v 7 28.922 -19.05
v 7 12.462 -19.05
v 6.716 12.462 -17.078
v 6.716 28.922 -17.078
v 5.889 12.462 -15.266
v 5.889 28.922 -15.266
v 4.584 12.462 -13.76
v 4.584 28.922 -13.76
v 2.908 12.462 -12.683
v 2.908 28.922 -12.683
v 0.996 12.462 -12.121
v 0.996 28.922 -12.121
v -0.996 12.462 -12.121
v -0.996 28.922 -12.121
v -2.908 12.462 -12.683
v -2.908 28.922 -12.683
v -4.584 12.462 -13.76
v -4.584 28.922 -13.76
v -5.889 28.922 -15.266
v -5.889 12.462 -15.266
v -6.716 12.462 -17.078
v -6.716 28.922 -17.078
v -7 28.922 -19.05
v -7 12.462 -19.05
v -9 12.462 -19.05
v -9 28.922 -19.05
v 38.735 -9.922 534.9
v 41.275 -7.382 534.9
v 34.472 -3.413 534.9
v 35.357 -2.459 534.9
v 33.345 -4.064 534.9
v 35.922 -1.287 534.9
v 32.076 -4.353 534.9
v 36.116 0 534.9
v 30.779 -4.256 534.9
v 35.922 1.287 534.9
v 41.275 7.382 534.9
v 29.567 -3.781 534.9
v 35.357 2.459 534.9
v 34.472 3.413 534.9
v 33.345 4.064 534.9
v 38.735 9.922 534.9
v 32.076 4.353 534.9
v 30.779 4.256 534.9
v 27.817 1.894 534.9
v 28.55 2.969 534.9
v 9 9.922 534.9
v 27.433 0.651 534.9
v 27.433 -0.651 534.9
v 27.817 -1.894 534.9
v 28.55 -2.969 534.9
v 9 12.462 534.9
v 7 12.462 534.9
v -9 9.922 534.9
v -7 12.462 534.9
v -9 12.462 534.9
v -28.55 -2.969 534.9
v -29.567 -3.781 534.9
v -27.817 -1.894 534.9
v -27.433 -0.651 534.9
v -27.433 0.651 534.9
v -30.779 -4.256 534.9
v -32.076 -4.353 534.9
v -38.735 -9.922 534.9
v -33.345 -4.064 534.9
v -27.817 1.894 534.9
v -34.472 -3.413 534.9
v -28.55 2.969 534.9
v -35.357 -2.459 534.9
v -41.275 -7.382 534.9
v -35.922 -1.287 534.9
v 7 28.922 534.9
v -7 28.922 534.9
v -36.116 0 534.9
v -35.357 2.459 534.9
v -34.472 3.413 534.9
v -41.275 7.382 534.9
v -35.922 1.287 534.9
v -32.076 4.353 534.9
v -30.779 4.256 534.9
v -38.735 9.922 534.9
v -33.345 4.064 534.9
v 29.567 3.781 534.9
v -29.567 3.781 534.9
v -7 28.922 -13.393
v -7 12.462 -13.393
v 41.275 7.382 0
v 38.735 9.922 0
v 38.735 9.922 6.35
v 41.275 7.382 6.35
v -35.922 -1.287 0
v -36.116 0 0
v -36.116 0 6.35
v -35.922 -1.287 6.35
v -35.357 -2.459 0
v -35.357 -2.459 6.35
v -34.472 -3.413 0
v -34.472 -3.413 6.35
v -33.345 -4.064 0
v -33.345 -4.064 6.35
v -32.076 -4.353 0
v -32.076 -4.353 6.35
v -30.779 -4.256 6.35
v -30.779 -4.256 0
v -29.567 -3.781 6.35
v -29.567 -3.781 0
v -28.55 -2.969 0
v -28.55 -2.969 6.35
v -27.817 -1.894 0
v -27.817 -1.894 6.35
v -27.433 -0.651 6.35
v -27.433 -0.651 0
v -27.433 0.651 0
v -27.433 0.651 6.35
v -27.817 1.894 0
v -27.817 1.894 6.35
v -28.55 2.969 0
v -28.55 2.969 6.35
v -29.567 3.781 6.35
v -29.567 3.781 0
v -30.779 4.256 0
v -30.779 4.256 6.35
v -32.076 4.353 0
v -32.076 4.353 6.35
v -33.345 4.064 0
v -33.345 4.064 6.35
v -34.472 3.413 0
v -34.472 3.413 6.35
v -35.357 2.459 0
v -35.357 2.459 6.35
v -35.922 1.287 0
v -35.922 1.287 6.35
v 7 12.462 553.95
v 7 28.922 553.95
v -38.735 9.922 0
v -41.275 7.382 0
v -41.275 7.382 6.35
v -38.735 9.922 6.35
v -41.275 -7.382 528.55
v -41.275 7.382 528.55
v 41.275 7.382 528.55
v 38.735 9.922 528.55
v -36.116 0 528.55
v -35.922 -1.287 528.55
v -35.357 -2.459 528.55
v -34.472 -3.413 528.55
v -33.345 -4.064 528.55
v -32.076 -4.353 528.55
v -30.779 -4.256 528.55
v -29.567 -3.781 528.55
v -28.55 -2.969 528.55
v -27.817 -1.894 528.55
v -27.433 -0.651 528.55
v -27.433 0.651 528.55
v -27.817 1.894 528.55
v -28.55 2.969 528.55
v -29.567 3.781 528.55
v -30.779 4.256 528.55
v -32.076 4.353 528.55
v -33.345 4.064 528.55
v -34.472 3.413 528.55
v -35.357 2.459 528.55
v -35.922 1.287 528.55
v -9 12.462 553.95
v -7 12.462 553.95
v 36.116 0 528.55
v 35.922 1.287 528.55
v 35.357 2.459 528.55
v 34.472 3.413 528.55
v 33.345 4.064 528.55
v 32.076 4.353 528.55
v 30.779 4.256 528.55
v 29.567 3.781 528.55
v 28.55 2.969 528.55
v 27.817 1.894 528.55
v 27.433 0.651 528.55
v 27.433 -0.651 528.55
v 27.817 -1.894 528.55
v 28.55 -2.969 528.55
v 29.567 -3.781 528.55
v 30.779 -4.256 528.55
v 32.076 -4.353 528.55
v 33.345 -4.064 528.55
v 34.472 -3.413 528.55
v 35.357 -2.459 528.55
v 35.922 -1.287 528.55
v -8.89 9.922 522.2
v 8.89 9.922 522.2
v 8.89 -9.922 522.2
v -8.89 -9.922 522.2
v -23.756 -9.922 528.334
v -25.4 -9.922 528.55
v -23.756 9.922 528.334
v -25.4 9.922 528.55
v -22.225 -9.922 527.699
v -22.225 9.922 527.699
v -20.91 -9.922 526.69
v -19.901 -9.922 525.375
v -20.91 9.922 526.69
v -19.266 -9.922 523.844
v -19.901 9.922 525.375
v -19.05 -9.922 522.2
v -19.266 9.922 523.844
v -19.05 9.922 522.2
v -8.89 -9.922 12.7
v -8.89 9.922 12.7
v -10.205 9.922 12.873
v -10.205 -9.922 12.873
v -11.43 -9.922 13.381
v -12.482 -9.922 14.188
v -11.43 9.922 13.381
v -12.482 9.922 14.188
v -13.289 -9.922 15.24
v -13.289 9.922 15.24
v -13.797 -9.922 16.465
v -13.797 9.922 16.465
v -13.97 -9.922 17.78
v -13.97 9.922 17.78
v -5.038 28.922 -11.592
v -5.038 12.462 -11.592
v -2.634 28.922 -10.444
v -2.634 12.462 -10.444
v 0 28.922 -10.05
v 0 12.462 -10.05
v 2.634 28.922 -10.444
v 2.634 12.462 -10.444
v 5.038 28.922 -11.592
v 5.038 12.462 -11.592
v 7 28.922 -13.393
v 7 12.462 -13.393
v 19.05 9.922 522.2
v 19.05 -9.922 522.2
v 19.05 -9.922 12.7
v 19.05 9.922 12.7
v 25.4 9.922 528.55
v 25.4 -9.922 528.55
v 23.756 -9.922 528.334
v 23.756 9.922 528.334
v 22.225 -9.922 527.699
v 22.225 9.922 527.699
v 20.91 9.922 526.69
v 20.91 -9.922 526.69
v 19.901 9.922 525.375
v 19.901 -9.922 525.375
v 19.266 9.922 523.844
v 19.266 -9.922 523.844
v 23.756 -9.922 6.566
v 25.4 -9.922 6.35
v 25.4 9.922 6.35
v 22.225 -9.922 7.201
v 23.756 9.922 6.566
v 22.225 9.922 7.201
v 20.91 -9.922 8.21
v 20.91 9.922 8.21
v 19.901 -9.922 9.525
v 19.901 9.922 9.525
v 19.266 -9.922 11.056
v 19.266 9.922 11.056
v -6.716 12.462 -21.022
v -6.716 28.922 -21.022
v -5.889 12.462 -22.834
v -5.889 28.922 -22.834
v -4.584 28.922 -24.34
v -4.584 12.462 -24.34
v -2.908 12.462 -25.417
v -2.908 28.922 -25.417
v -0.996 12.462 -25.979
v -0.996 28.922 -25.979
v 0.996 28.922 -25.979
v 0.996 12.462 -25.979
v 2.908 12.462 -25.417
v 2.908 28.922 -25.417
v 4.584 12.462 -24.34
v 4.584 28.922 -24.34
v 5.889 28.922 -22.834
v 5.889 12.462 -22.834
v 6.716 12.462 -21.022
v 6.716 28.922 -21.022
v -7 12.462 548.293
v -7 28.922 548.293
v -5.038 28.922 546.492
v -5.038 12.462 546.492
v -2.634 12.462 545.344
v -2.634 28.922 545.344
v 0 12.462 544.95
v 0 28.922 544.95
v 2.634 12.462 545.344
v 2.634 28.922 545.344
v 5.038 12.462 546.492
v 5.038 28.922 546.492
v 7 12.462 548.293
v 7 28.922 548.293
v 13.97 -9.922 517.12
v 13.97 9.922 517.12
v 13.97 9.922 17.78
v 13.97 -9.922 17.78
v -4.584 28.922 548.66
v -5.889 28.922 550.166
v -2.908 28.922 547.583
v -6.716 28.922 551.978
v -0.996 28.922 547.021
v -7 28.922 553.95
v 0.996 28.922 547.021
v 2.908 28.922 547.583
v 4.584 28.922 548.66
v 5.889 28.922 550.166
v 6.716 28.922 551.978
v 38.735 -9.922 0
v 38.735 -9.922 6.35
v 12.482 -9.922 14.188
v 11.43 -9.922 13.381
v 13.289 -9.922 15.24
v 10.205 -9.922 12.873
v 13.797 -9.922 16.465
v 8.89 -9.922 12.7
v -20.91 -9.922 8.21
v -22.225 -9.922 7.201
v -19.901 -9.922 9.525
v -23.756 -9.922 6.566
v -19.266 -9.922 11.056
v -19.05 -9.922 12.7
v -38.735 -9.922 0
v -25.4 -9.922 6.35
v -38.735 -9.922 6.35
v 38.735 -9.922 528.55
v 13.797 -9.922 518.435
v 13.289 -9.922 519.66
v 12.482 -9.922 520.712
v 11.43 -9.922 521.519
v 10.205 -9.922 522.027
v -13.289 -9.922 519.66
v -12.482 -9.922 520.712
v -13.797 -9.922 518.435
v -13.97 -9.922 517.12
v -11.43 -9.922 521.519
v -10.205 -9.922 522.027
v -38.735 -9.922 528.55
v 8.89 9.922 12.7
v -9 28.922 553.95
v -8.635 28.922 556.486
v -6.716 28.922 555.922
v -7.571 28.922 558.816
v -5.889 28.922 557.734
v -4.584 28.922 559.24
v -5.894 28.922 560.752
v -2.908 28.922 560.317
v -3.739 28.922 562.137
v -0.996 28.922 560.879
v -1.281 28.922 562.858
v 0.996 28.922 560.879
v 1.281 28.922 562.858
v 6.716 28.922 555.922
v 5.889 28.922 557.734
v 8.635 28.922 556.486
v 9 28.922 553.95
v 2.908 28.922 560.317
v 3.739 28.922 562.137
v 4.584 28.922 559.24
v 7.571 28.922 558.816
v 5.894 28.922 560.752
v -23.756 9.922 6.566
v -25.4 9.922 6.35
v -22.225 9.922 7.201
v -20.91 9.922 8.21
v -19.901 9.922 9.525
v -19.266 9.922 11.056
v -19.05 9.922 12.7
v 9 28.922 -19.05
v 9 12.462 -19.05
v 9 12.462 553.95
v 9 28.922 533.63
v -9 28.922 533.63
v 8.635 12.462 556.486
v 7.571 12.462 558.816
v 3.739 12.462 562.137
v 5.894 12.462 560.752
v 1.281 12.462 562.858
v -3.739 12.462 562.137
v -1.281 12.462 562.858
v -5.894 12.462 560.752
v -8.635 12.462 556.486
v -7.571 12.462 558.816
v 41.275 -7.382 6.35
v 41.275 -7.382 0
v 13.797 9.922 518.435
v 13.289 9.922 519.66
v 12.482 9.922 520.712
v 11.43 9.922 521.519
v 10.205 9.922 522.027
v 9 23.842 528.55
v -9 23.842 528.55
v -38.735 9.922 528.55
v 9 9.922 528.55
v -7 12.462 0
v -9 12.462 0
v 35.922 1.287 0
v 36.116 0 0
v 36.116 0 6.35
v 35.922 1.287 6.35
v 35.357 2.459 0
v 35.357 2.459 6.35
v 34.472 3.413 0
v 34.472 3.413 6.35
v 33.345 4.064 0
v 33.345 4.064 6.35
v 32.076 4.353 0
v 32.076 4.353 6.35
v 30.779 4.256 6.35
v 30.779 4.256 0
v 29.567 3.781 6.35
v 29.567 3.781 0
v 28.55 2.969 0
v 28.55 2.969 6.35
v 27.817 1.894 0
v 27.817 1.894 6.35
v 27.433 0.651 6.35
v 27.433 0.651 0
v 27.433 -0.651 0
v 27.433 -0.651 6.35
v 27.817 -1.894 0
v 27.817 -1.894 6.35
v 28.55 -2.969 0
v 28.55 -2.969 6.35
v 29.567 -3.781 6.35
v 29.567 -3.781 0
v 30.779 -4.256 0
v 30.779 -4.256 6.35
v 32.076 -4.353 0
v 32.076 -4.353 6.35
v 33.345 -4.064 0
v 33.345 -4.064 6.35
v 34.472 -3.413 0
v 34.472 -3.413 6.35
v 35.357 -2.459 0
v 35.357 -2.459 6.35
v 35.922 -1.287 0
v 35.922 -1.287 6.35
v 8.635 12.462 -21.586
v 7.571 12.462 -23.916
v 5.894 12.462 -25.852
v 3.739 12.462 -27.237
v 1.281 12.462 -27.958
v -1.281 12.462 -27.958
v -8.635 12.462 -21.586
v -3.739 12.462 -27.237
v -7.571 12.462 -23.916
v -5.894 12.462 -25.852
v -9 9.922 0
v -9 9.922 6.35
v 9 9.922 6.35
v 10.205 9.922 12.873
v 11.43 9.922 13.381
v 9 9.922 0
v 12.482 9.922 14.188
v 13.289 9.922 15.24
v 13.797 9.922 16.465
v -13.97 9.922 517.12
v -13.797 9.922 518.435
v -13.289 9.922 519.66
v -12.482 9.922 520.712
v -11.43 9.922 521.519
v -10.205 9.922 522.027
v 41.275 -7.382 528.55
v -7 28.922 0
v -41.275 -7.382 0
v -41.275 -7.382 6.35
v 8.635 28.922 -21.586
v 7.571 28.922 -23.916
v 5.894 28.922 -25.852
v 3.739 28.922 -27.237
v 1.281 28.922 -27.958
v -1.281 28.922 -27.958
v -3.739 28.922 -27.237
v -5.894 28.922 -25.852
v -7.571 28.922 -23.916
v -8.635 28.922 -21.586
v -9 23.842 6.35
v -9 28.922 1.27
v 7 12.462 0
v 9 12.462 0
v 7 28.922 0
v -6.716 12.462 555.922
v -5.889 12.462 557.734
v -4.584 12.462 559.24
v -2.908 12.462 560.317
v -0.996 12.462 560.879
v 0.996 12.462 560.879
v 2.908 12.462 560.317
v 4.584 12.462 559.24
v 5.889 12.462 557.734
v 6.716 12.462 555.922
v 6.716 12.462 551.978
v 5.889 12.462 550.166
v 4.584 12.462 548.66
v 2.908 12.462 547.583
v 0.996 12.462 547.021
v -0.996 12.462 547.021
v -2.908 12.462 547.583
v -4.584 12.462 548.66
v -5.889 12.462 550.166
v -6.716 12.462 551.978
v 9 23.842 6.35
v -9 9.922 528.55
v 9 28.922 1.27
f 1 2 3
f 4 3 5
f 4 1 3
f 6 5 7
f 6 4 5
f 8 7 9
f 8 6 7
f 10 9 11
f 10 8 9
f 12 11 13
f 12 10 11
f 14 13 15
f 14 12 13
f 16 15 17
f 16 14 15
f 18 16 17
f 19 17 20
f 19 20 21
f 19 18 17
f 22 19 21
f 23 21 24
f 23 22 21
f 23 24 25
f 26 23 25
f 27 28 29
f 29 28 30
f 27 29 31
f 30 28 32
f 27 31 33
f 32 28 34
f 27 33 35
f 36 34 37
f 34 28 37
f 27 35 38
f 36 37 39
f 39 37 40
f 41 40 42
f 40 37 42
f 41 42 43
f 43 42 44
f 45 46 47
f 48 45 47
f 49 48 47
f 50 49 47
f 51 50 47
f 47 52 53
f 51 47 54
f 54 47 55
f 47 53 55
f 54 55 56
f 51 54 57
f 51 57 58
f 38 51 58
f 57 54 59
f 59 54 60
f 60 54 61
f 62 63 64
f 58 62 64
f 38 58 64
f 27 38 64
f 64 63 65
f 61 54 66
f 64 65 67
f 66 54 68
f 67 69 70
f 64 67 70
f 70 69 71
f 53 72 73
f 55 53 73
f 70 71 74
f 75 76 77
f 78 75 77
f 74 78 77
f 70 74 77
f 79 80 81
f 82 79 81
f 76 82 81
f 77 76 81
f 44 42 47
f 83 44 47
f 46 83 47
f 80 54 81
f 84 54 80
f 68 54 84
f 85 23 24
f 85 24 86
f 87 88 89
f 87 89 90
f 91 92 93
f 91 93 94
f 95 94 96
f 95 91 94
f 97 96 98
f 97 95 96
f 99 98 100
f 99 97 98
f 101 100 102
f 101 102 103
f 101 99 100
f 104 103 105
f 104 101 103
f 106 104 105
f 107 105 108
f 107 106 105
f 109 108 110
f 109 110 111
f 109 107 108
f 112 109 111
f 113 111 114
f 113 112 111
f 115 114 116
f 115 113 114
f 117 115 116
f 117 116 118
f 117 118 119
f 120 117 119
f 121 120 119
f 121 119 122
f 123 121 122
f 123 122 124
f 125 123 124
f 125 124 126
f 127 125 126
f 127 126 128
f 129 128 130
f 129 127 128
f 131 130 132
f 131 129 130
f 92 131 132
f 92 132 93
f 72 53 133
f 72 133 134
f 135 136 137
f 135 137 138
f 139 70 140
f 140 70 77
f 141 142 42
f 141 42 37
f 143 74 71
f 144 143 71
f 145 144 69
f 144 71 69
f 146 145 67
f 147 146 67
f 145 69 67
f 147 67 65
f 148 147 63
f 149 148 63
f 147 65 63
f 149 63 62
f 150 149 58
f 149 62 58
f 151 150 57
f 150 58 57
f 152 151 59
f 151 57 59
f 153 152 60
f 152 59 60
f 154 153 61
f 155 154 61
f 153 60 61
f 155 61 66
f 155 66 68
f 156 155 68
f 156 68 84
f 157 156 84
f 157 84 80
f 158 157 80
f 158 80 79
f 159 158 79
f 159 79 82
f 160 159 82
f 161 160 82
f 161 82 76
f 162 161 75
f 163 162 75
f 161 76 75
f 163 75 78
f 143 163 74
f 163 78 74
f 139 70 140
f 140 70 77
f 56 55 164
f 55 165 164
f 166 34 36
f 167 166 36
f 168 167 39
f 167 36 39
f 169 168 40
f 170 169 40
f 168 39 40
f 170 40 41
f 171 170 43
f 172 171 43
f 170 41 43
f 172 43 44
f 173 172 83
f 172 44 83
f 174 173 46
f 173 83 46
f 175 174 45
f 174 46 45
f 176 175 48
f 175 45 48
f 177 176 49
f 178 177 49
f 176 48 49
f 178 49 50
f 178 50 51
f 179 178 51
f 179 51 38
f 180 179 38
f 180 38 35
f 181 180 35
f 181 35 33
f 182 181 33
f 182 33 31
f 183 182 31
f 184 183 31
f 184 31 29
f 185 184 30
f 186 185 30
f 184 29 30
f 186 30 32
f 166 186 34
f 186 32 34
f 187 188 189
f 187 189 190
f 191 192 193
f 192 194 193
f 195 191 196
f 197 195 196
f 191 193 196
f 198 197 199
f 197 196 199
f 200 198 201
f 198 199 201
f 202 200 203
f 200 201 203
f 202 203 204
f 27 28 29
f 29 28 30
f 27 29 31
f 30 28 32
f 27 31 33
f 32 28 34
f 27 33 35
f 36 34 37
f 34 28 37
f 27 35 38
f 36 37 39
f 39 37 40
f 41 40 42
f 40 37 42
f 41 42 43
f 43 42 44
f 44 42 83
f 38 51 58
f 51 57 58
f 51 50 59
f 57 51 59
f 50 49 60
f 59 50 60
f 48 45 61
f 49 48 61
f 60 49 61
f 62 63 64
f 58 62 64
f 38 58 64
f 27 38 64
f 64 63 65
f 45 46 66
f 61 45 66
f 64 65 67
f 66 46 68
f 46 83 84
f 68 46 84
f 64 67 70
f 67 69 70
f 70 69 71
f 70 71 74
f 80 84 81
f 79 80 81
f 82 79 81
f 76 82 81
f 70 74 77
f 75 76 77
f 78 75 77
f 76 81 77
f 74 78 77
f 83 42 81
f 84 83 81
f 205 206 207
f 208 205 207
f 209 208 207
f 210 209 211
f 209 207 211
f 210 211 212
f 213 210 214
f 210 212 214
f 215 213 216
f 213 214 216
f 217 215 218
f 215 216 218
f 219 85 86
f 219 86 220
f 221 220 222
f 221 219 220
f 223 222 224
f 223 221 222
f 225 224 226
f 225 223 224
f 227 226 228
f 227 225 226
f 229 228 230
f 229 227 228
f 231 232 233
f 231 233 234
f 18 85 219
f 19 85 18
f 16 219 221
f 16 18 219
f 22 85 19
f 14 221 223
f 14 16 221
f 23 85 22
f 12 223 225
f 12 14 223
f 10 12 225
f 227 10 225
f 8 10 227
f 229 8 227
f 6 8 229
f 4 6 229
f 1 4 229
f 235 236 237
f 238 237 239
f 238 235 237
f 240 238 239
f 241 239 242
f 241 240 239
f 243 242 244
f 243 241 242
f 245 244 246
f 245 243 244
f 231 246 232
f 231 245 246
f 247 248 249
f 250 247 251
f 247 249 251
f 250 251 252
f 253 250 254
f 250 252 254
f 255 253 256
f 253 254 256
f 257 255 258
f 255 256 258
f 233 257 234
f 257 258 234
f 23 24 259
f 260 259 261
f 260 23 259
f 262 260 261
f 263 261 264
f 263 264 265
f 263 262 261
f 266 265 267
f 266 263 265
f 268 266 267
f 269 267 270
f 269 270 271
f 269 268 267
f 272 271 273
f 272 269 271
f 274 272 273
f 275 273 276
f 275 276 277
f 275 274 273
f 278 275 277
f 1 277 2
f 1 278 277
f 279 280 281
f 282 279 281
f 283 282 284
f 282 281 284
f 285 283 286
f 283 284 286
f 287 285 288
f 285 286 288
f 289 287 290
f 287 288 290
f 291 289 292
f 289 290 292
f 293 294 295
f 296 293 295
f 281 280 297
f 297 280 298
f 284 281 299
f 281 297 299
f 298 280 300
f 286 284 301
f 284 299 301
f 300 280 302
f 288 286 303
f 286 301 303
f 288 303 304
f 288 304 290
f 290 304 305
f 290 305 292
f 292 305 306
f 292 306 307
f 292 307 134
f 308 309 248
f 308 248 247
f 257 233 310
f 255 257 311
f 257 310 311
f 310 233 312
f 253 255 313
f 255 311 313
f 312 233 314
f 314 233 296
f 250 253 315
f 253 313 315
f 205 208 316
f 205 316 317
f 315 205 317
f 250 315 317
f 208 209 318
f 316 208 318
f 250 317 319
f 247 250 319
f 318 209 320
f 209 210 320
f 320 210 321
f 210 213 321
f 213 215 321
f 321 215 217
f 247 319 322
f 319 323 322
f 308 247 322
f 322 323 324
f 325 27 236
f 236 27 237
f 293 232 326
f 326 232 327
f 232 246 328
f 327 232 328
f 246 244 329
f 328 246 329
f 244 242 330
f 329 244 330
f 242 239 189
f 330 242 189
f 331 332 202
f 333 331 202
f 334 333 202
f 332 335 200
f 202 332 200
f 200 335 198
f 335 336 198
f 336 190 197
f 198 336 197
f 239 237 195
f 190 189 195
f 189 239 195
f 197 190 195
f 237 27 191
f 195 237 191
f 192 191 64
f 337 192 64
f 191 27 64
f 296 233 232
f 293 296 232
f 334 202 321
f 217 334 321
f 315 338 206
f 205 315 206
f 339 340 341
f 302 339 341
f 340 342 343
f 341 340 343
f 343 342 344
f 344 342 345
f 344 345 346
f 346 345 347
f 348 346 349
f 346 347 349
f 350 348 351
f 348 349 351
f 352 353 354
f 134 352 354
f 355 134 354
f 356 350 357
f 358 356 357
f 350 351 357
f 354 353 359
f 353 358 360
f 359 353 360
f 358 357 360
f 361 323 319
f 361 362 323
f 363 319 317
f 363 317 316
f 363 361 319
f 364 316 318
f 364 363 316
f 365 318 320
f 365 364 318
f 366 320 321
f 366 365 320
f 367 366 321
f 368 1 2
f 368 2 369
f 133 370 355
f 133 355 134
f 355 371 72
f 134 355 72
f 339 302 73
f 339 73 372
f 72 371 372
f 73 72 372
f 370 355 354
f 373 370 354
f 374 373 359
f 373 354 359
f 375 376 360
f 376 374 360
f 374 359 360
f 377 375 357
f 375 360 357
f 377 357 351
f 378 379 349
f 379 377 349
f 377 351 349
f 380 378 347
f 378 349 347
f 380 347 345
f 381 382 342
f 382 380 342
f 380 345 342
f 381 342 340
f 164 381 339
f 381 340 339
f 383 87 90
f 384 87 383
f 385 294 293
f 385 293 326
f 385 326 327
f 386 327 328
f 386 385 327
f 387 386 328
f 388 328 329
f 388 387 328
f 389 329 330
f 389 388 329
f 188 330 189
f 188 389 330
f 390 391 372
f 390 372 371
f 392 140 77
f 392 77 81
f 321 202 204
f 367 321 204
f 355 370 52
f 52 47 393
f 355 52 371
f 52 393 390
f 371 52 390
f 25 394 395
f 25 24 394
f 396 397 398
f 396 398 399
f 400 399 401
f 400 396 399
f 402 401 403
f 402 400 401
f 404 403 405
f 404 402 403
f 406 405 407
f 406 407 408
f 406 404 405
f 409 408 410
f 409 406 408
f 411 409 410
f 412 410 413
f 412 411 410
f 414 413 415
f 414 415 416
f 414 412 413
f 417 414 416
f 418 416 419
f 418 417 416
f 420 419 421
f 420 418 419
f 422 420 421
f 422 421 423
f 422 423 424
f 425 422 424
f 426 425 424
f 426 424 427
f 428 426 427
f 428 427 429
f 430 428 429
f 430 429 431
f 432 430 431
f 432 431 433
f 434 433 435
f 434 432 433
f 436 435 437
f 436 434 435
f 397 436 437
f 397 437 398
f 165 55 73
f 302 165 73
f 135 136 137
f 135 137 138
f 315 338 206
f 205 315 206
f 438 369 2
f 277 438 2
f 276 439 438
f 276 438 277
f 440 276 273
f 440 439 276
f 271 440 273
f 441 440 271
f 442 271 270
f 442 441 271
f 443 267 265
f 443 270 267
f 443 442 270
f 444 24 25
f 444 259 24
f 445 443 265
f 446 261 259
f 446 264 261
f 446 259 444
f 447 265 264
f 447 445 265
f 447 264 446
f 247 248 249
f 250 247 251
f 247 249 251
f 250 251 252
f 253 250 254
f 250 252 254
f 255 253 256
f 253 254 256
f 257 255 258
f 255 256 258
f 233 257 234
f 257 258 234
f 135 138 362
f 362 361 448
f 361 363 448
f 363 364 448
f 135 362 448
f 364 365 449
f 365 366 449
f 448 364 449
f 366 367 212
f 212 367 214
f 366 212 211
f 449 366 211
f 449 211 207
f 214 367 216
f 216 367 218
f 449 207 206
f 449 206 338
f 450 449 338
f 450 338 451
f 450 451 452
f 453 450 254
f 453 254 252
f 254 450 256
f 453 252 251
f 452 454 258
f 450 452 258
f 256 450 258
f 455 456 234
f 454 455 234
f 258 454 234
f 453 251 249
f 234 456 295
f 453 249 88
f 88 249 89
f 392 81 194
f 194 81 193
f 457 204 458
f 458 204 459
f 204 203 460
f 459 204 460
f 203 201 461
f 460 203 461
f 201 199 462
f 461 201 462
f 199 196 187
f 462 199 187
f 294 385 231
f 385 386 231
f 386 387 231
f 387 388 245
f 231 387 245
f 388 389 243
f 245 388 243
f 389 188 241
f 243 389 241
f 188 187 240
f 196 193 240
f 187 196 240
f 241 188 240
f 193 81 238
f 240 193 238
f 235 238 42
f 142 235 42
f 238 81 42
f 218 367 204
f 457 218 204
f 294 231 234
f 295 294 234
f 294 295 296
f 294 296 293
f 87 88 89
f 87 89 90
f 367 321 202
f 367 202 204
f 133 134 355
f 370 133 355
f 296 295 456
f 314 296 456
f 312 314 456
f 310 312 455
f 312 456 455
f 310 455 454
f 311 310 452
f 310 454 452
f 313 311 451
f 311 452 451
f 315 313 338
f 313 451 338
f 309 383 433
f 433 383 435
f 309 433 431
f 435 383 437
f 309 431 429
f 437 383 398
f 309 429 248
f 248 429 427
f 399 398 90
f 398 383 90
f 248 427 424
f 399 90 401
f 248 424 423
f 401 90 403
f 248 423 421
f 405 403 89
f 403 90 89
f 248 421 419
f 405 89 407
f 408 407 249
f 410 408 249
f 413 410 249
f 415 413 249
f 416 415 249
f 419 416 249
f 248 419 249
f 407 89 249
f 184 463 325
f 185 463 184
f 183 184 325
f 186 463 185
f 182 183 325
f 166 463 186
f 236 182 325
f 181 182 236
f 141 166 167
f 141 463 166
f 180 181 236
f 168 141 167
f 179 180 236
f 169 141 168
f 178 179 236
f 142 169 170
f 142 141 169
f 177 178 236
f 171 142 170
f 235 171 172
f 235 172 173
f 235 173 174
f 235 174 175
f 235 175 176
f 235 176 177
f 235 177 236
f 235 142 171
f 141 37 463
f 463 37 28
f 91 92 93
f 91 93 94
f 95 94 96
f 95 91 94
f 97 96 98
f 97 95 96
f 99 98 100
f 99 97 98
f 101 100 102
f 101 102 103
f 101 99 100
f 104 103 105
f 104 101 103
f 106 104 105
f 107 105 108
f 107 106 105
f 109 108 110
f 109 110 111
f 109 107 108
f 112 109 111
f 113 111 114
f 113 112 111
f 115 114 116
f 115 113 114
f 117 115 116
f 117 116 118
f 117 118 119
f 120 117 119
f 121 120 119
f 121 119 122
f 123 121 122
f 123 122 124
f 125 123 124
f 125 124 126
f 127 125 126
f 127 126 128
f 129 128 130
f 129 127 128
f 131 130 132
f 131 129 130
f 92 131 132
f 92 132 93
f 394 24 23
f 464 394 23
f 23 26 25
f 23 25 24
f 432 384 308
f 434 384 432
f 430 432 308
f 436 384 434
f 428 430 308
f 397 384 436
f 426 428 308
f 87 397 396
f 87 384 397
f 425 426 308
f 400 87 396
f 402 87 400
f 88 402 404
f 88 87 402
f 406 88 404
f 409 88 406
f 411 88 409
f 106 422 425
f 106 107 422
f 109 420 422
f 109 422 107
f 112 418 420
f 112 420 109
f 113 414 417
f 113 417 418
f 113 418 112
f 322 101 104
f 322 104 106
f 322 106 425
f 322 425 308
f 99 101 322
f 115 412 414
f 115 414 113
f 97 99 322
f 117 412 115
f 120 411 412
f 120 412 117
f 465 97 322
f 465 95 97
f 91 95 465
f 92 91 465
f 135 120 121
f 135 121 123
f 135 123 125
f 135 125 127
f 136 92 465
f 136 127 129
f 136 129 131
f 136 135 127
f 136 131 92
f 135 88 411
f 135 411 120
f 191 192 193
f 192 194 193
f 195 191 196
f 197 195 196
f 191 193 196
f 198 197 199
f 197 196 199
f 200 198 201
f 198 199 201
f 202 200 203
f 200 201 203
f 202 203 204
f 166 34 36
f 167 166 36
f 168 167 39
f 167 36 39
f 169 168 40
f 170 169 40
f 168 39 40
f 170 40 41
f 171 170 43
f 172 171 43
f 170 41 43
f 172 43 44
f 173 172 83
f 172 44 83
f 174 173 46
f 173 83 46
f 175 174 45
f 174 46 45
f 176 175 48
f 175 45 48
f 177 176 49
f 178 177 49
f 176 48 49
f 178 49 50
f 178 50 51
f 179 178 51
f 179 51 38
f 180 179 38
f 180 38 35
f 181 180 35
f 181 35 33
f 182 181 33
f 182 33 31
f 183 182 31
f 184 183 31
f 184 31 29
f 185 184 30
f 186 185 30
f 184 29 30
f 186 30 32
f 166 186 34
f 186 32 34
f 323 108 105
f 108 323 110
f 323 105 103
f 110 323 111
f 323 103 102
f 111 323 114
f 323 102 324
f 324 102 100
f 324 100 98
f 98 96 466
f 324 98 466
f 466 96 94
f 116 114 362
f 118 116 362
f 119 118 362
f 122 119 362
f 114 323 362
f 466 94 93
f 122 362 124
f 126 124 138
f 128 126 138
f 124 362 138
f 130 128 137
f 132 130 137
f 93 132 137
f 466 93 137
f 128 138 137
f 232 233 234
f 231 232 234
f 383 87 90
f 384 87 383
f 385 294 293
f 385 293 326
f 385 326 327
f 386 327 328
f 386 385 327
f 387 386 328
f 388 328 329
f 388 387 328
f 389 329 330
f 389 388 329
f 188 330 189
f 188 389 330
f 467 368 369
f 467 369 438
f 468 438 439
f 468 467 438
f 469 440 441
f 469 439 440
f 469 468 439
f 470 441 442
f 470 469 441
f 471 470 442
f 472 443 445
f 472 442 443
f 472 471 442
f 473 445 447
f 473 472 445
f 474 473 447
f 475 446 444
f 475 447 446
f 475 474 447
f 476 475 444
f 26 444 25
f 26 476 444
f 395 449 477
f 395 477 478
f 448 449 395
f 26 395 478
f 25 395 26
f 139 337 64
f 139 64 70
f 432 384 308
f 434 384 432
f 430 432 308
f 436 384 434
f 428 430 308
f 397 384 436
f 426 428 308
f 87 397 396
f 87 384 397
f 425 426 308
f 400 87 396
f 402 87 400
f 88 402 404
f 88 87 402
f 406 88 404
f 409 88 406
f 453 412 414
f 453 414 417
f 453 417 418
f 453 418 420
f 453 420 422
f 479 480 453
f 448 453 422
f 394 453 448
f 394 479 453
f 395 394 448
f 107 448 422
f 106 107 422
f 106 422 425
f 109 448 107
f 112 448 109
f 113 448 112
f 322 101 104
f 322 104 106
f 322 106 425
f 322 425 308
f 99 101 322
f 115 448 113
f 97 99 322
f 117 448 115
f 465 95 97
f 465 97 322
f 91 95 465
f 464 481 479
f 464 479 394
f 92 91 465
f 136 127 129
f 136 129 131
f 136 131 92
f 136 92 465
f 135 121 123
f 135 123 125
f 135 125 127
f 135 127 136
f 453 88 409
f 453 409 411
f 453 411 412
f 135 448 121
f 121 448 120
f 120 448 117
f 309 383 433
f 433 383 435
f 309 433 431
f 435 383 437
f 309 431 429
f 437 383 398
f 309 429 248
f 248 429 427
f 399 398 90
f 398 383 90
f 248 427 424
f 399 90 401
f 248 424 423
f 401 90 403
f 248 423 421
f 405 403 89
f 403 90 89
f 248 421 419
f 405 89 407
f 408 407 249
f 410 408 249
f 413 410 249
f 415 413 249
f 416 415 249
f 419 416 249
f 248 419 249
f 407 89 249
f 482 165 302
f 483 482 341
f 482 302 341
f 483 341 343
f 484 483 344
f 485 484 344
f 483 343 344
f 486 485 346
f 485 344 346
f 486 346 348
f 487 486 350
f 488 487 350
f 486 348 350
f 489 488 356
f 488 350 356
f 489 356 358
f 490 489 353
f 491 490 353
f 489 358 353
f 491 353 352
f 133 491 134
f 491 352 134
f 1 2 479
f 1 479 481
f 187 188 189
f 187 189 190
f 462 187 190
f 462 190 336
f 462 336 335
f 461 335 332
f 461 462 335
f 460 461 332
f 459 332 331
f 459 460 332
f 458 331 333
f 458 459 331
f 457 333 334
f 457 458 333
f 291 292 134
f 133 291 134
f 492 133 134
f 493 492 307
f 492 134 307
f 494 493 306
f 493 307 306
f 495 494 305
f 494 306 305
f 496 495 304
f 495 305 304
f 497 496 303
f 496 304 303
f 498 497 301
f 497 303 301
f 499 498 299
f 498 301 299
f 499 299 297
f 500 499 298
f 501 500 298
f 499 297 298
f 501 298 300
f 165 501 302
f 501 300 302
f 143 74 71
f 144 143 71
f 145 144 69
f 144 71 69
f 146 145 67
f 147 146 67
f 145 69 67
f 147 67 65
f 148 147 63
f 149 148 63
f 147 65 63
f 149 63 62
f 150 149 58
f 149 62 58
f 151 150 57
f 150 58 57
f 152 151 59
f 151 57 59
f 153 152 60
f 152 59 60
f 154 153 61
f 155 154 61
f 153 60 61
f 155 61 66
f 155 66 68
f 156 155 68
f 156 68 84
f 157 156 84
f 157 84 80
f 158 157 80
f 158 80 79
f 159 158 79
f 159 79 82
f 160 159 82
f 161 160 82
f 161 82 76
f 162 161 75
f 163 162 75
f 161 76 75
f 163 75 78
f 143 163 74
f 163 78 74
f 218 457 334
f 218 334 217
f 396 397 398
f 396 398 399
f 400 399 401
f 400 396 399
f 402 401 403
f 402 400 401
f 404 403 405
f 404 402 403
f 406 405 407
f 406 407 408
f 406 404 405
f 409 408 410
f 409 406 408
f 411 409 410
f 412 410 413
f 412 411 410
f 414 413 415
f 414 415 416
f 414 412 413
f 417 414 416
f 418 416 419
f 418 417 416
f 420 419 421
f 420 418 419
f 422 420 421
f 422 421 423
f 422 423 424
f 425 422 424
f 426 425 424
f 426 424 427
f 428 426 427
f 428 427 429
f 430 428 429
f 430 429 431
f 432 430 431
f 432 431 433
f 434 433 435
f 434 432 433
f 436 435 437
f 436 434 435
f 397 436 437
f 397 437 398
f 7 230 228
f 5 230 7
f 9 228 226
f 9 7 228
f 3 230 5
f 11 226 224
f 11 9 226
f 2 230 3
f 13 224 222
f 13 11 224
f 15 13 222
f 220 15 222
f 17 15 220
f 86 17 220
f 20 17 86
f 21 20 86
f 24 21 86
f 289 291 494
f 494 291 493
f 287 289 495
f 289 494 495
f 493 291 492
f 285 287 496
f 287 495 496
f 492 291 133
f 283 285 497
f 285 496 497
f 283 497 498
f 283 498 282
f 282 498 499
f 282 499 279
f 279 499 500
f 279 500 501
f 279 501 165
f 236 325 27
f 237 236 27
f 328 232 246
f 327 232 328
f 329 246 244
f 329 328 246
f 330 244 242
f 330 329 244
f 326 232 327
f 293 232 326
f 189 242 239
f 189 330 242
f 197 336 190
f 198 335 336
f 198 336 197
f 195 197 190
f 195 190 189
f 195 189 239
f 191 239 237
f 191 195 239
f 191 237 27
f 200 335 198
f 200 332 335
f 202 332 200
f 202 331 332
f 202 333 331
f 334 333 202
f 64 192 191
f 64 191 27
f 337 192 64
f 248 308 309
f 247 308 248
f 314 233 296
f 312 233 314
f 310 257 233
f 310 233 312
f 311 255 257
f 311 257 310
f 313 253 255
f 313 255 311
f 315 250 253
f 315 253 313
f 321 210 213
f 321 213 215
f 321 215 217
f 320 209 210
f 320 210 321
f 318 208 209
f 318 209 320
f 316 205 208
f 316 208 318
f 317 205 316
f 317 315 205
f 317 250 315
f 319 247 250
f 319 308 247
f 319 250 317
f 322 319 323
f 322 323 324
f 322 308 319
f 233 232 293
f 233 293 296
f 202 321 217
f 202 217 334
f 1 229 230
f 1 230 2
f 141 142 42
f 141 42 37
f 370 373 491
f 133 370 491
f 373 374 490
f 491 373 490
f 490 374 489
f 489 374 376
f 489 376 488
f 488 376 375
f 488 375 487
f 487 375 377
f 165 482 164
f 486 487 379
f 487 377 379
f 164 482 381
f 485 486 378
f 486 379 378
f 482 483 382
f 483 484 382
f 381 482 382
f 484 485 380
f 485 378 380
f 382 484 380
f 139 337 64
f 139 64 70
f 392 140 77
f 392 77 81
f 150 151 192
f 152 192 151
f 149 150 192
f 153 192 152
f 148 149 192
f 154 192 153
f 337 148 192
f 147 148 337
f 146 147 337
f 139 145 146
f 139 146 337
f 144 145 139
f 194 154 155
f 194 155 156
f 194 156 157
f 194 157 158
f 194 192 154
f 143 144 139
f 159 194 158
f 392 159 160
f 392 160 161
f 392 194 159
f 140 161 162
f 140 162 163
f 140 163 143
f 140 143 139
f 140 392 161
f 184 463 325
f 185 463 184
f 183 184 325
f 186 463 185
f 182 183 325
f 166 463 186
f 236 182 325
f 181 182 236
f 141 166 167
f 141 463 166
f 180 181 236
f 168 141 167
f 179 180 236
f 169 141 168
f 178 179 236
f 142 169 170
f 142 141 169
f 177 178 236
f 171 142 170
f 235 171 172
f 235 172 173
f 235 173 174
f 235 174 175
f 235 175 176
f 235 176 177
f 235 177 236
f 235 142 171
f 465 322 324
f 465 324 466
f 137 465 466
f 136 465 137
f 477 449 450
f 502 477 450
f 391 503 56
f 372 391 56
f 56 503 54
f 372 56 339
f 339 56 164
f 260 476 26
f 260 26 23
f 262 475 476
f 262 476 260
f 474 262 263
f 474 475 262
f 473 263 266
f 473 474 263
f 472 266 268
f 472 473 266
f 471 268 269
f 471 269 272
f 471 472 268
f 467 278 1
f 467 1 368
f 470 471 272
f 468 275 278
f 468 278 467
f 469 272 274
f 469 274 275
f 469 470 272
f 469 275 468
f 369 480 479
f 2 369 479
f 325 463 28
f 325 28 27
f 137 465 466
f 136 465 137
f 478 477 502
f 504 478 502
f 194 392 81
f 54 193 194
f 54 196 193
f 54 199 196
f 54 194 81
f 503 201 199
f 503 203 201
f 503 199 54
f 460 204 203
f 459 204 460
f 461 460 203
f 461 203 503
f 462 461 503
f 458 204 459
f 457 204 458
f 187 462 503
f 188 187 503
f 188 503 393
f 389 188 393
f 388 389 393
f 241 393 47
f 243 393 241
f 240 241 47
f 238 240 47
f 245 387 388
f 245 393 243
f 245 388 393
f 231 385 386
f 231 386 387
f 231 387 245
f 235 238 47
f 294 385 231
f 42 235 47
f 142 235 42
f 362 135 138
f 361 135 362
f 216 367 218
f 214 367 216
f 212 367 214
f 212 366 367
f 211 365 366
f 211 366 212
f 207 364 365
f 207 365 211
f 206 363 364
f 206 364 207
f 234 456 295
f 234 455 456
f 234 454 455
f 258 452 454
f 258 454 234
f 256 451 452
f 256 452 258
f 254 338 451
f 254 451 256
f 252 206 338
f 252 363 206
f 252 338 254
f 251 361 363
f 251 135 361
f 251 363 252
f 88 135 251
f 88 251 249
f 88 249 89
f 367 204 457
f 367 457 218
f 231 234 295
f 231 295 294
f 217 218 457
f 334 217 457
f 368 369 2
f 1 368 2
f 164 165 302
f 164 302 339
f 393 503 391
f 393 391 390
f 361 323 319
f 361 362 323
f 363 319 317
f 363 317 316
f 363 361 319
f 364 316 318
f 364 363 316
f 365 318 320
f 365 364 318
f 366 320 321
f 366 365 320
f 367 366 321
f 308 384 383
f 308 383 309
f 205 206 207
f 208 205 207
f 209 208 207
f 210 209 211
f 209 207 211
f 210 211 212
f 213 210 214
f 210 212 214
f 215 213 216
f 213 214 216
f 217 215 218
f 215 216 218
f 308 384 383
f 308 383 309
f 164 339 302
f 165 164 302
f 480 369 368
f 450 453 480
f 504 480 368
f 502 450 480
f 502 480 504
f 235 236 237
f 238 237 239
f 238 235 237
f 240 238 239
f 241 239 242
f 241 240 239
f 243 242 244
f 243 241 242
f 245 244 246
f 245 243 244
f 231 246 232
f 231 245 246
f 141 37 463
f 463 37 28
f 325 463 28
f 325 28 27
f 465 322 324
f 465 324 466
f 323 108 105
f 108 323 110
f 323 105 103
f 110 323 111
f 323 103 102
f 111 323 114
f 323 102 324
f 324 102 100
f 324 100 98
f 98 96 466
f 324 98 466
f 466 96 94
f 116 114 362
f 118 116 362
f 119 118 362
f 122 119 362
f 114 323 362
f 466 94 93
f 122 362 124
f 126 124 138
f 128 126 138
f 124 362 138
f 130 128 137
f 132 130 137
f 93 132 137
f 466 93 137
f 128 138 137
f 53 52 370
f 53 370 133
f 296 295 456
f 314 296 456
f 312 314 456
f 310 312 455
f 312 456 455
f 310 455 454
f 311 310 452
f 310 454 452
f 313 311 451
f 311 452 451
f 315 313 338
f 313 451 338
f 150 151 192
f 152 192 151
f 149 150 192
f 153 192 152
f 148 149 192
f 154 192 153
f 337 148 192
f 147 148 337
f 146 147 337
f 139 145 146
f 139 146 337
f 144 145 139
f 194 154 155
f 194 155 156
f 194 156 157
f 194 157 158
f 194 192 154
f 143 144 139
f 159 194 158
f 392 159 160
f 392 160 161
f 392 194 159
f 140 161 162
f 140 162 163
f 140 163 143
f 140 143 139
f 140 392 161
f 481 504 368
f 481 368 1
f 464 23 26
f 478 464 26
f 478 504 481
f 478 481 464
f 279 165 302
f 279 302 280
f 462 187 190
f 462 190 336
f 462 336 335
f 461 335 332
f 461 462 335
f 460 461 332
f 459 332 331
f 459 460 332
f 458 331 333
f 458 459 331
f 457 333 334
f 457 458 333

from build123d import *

# Parameters (mm, degrees)
SKETCH1_R              = 4.365625
BOSS_EXTRUDE1_DEPTH    = 6.35
SKETCH2_W              = 38.1
SKETCH2_H              = 19.84375
BOSS_EXTRUDE2_DEPTH    = 261.1
FILLET1_R              = 6.35
CUT_EXTRUDE1_DEPTH     = 177.8
SKETCH4_W              = 18
SKETCH4_H              = 6.35
BOSS_EXTRUDE3_DEPTH    = 19
SKETCH5_W              = 2
SKETCH5_H              = 19
BOSS_EXTRUDE4_DEPTH    = 19.05
BOSS_EXTRUDE6_DEPTH    = 19.05
BOSS_EXTRUDE6_2_DEPTH  = 19.05
CUT_EXTRUDE3_START     = -2.54
CUT_EXTRUDE3_OUTLINE_R = 7
CUT_EXTRUDE3_DEPTH     = 2.59
CHAMFER1_SIZE          = 5.08
CHAMFER2_SIZE          = 5.08


# Read off the part's stored shape, not the designer's step: Cut-Extrude3
with BuildPart() as part:
    # Sketch1 → Boss-Extrude1 (new body)
    with BuildSketch(Plane.XY):
        Polygon((-41.275, 7.381875), (-38.735, 9.921875), (38.735, 9.921875), (41.275, 7.381875), (41.275, -7.381875), (38.735, -9.921875), (-38.735, -9.921875), (-41.275, -7.381875), align=None)
        with Locations((31.75, 0)):
            Circle(SKETCH1_R, mode=Mode.SUBTRACT)
        with Locations(Location((-31.75, 0, 0), (0, 0, 180))):
            Circle(SKETCH1_R, mode=Mode.SUBTRACT)
    extrude(amount=BOSS_EXTRUDE1_DEPTH)

    # Sketch2 → Boss-Extrude2 (add)
    with BuildSketch(Plane.XY.offset(6.35)):
        Rectangle(SKETCH2_W, SKETCH2_H)
    extrude(amount=BOSS_EXTRUDE2_DEPTH)

    # Fillet1
    fillet1_edges = [part.edges().sort_by_distance(p)[0] for p in [
        (-19.05, 0, 6.35),
        (19.05, 0, 6.35),
    ]]
    fillet(fillet1_edges, radius=FILLET1_R)

    # Sketch3 → Cut-Extrude1 (cut)
    with BuildSketch(Plane(origin=(0, 9.921875, 0), x_dir=(1, 0, 0), z_dir=(0, 1, 0))):
        with BuildLine():
            Line((8.89, -12.7), (-8.89, -12.7))
            ThreePointArc((-8.89, -12.7), (-12.482102448, -14.187897552), (-13.97, -17.78))
            Line((-13.97, -17.78), (-13.97, -350.52))
            ThreePointArc((-13.97, -350.52), (-12.482102448, -354.112102448), (-8.89, -355.6))
            Line((-8.89, -355.6), (8.89, -355.6))
            ThreePointArc((8.89, -355.6), (12.482102448, -354.112102448), (13.97, -350.52))
            Line((13.97, -350.52), (13.97, -17.78))
            ThreePointArc((13.97, -17.78), (12.482102448, -14.187897552), (8.89, -12.7))
        make_face()
    extrude(amount=-CUT_EXTRUDE1_DEPTH, mode=Mode.SUBTRACT)

    # Mirror2: part across plane


with BuildPart() as part_1:
    add(part.part)
    add(part.part.mirror(Plane.XY.offset(267.45)))

    # Sketch4 → Boss-Extrude3 (add)
    with BuildSketch(Plane(origin=(0, 9.921875, 0), x_dir=(1, 0, 0), z_dir=(0, 1, 0))):
        with Locations((0, -3.175)):
            Rectangle(SKETCH4_W, SKETCH4_H)
    extrude(amount=BOSS_EXTRUDE3_DEPTH)

    # Sketch5 → Boss-Extrude4 (add)
    with BuildSketch(Plane(origin=(0, 0, 0), x_dir=(-1, 0, 0), z_dir=(0, 0, -1))):
        with Locations((-8, 19.421875)):
            Rectangle(SKETCH5_W, SKETCH5_H)
        with Locations((8, 19.421875)):
            Rectangle(SKETCH5_W, SKETCH5_H)
    extrude(amount=BOSS_EXTRUDE4_DEPTH)


with BuildPart() as body_2:
    # Sketch6 → Boss-Extrude6 (new body)
    with BuildSketch(Plane(origin=(0, 28.921875, 0), x_dir=(1, 0, 0), z_dir=(0, 1, 0))):
        with BuildLine():
            Line((7, 13.393145751), (7, 19.05))
            ThreePointArc((7, 19.05), (0, 12.05), (-7, 19.05))
            Line((-7, 19.05), (-7, 13.393145751))
            ThreePointArc((-7, 13.393145751), (0, 10.05), (7, 13.393145751))
        make_face()
    extrude(amount=-BOSS_EXTRUDE6_DEPTH)


with BuildPart() as body_3:
    # Sketch6 → Boss-Extrude6 2 (new body)
    with BuildSketch(Plane(origin=(0, 28.921875, 0), x_dir=(1, 0, 0), z_dir=(0, 1, 0))):
        with BuildLine():
            ThreePointArc((9, 19.05), (0, 28.05), (-9, 19.05))
            Line((-9, 19.05), (-7, 19.05))
            ThreePointArc((-7, 19.05), (0, 26.05), (7, 19.05))
            Line((7, 19.05), (9, 19.05))
        make_face()
    extrude(amount=-BOSS_EXTRUDE6_2_DEPTH)


with BuildPart() as cut_extrude3_tool:
    # Cut-Extrude3 outline → Cut-Extrude3 (new body)
    with BuildSketch(Plane(origin=(0, 9.921875, 0), x_dir=(-1, 0, 0), z_dir=(0, -1, 0)).offset(CUT_EXTRUDE3_START)):
        with BuildLine():
            Line((9, 0), (9, 19.05))
            ThreePointArc((9, 19.05), (0, 28.05), (-9, 19.05))
            Line((-9, 19.05), (-9, 0))
            Line((-9, 0), (-7, 0))
            Line((-7, 0), (-7, 13.393145751))
            ThreePointArc((-7, 13.393145751), (0, 10.05), (7, 13.393145751))
            Line((7, 13.393145751), (7, 0))
            Line((7, 0), (9, 0))
        make_face()
        with Locations((0, 19.05)):
            Circle(CUT_EXTRUDE3_OUTLINE_R, mode=Mode.SUBTRACT)
    extrude(amount=CUT_EXTRUDE3_DEPTH)


with BuildPart() as part_2:
    add(part_1.part)

    # Cut-Extrude3: cut by cut_extrude3_tool
    add(cut_extrude3_tool.part, mode=Mode.SUBTRACT)


with BuildPart() as body_2_1:
    add(body_2.part)

    # Cut-Extrude3: cut by cut_extrude3_tool
    add(cut_extrude3_tool.part, mode=Mode.SUBTRACT)


with BuildPart() as body_3_1:
    add(body_3.part)

    # Cut-Extrude3: cut by cut_extrude3_tool
    add(cut_extrude3_tool.part, mode=Mode.SUBTRACT)


with BuildPart() as body_4:
    # Mirror9: mirrored copy
    add(part_2.part.mirror(Plane(origin=(0, 0, 267.45), x_dir=(1, 0, 0), z_dir=(0, 0, -1))))

    # Chamfer2
    chamfer2_edges = [body_4.edges().sort_by_distance(p)[0] for p in [
        (0, 28.921875, 528.55),
    ]]
    chamfer(chamfer2_edges, length=CHAMFER2_SIZE)


with BuildPart() as body_5:
    # Mirror10: mirrored copy
    add(body_3_1.part.mirror(Plane(origin=(0, 0, 267.45), x_dir=(1, 0, 0), z_dir=(0, 0, -1))))


with BuildPart() as body_6:
    # Mirror10 2: mirrored copy
    add(body_2_1.part.mirror(Plane(origin=(0, 0, 267.45), x_dir=(1, 0, 0), z_dir=(0, 0, -1))))


with BuildPart() as part_3:
    add(part_2.part)

    # Chamfer1
    chamfer1_edges = [part_3.edges().sort_by_distance(p)[0] for p in [
        (0, 28.921875, 6.35),
    ]]
    chamfer(chamfer1_edges, length=CHAMFER1_SIZE)


solid = Compound([body_2_1.part, body_3_1.part, body_4.part, body_5.part, body_6.part, part_3.part])
